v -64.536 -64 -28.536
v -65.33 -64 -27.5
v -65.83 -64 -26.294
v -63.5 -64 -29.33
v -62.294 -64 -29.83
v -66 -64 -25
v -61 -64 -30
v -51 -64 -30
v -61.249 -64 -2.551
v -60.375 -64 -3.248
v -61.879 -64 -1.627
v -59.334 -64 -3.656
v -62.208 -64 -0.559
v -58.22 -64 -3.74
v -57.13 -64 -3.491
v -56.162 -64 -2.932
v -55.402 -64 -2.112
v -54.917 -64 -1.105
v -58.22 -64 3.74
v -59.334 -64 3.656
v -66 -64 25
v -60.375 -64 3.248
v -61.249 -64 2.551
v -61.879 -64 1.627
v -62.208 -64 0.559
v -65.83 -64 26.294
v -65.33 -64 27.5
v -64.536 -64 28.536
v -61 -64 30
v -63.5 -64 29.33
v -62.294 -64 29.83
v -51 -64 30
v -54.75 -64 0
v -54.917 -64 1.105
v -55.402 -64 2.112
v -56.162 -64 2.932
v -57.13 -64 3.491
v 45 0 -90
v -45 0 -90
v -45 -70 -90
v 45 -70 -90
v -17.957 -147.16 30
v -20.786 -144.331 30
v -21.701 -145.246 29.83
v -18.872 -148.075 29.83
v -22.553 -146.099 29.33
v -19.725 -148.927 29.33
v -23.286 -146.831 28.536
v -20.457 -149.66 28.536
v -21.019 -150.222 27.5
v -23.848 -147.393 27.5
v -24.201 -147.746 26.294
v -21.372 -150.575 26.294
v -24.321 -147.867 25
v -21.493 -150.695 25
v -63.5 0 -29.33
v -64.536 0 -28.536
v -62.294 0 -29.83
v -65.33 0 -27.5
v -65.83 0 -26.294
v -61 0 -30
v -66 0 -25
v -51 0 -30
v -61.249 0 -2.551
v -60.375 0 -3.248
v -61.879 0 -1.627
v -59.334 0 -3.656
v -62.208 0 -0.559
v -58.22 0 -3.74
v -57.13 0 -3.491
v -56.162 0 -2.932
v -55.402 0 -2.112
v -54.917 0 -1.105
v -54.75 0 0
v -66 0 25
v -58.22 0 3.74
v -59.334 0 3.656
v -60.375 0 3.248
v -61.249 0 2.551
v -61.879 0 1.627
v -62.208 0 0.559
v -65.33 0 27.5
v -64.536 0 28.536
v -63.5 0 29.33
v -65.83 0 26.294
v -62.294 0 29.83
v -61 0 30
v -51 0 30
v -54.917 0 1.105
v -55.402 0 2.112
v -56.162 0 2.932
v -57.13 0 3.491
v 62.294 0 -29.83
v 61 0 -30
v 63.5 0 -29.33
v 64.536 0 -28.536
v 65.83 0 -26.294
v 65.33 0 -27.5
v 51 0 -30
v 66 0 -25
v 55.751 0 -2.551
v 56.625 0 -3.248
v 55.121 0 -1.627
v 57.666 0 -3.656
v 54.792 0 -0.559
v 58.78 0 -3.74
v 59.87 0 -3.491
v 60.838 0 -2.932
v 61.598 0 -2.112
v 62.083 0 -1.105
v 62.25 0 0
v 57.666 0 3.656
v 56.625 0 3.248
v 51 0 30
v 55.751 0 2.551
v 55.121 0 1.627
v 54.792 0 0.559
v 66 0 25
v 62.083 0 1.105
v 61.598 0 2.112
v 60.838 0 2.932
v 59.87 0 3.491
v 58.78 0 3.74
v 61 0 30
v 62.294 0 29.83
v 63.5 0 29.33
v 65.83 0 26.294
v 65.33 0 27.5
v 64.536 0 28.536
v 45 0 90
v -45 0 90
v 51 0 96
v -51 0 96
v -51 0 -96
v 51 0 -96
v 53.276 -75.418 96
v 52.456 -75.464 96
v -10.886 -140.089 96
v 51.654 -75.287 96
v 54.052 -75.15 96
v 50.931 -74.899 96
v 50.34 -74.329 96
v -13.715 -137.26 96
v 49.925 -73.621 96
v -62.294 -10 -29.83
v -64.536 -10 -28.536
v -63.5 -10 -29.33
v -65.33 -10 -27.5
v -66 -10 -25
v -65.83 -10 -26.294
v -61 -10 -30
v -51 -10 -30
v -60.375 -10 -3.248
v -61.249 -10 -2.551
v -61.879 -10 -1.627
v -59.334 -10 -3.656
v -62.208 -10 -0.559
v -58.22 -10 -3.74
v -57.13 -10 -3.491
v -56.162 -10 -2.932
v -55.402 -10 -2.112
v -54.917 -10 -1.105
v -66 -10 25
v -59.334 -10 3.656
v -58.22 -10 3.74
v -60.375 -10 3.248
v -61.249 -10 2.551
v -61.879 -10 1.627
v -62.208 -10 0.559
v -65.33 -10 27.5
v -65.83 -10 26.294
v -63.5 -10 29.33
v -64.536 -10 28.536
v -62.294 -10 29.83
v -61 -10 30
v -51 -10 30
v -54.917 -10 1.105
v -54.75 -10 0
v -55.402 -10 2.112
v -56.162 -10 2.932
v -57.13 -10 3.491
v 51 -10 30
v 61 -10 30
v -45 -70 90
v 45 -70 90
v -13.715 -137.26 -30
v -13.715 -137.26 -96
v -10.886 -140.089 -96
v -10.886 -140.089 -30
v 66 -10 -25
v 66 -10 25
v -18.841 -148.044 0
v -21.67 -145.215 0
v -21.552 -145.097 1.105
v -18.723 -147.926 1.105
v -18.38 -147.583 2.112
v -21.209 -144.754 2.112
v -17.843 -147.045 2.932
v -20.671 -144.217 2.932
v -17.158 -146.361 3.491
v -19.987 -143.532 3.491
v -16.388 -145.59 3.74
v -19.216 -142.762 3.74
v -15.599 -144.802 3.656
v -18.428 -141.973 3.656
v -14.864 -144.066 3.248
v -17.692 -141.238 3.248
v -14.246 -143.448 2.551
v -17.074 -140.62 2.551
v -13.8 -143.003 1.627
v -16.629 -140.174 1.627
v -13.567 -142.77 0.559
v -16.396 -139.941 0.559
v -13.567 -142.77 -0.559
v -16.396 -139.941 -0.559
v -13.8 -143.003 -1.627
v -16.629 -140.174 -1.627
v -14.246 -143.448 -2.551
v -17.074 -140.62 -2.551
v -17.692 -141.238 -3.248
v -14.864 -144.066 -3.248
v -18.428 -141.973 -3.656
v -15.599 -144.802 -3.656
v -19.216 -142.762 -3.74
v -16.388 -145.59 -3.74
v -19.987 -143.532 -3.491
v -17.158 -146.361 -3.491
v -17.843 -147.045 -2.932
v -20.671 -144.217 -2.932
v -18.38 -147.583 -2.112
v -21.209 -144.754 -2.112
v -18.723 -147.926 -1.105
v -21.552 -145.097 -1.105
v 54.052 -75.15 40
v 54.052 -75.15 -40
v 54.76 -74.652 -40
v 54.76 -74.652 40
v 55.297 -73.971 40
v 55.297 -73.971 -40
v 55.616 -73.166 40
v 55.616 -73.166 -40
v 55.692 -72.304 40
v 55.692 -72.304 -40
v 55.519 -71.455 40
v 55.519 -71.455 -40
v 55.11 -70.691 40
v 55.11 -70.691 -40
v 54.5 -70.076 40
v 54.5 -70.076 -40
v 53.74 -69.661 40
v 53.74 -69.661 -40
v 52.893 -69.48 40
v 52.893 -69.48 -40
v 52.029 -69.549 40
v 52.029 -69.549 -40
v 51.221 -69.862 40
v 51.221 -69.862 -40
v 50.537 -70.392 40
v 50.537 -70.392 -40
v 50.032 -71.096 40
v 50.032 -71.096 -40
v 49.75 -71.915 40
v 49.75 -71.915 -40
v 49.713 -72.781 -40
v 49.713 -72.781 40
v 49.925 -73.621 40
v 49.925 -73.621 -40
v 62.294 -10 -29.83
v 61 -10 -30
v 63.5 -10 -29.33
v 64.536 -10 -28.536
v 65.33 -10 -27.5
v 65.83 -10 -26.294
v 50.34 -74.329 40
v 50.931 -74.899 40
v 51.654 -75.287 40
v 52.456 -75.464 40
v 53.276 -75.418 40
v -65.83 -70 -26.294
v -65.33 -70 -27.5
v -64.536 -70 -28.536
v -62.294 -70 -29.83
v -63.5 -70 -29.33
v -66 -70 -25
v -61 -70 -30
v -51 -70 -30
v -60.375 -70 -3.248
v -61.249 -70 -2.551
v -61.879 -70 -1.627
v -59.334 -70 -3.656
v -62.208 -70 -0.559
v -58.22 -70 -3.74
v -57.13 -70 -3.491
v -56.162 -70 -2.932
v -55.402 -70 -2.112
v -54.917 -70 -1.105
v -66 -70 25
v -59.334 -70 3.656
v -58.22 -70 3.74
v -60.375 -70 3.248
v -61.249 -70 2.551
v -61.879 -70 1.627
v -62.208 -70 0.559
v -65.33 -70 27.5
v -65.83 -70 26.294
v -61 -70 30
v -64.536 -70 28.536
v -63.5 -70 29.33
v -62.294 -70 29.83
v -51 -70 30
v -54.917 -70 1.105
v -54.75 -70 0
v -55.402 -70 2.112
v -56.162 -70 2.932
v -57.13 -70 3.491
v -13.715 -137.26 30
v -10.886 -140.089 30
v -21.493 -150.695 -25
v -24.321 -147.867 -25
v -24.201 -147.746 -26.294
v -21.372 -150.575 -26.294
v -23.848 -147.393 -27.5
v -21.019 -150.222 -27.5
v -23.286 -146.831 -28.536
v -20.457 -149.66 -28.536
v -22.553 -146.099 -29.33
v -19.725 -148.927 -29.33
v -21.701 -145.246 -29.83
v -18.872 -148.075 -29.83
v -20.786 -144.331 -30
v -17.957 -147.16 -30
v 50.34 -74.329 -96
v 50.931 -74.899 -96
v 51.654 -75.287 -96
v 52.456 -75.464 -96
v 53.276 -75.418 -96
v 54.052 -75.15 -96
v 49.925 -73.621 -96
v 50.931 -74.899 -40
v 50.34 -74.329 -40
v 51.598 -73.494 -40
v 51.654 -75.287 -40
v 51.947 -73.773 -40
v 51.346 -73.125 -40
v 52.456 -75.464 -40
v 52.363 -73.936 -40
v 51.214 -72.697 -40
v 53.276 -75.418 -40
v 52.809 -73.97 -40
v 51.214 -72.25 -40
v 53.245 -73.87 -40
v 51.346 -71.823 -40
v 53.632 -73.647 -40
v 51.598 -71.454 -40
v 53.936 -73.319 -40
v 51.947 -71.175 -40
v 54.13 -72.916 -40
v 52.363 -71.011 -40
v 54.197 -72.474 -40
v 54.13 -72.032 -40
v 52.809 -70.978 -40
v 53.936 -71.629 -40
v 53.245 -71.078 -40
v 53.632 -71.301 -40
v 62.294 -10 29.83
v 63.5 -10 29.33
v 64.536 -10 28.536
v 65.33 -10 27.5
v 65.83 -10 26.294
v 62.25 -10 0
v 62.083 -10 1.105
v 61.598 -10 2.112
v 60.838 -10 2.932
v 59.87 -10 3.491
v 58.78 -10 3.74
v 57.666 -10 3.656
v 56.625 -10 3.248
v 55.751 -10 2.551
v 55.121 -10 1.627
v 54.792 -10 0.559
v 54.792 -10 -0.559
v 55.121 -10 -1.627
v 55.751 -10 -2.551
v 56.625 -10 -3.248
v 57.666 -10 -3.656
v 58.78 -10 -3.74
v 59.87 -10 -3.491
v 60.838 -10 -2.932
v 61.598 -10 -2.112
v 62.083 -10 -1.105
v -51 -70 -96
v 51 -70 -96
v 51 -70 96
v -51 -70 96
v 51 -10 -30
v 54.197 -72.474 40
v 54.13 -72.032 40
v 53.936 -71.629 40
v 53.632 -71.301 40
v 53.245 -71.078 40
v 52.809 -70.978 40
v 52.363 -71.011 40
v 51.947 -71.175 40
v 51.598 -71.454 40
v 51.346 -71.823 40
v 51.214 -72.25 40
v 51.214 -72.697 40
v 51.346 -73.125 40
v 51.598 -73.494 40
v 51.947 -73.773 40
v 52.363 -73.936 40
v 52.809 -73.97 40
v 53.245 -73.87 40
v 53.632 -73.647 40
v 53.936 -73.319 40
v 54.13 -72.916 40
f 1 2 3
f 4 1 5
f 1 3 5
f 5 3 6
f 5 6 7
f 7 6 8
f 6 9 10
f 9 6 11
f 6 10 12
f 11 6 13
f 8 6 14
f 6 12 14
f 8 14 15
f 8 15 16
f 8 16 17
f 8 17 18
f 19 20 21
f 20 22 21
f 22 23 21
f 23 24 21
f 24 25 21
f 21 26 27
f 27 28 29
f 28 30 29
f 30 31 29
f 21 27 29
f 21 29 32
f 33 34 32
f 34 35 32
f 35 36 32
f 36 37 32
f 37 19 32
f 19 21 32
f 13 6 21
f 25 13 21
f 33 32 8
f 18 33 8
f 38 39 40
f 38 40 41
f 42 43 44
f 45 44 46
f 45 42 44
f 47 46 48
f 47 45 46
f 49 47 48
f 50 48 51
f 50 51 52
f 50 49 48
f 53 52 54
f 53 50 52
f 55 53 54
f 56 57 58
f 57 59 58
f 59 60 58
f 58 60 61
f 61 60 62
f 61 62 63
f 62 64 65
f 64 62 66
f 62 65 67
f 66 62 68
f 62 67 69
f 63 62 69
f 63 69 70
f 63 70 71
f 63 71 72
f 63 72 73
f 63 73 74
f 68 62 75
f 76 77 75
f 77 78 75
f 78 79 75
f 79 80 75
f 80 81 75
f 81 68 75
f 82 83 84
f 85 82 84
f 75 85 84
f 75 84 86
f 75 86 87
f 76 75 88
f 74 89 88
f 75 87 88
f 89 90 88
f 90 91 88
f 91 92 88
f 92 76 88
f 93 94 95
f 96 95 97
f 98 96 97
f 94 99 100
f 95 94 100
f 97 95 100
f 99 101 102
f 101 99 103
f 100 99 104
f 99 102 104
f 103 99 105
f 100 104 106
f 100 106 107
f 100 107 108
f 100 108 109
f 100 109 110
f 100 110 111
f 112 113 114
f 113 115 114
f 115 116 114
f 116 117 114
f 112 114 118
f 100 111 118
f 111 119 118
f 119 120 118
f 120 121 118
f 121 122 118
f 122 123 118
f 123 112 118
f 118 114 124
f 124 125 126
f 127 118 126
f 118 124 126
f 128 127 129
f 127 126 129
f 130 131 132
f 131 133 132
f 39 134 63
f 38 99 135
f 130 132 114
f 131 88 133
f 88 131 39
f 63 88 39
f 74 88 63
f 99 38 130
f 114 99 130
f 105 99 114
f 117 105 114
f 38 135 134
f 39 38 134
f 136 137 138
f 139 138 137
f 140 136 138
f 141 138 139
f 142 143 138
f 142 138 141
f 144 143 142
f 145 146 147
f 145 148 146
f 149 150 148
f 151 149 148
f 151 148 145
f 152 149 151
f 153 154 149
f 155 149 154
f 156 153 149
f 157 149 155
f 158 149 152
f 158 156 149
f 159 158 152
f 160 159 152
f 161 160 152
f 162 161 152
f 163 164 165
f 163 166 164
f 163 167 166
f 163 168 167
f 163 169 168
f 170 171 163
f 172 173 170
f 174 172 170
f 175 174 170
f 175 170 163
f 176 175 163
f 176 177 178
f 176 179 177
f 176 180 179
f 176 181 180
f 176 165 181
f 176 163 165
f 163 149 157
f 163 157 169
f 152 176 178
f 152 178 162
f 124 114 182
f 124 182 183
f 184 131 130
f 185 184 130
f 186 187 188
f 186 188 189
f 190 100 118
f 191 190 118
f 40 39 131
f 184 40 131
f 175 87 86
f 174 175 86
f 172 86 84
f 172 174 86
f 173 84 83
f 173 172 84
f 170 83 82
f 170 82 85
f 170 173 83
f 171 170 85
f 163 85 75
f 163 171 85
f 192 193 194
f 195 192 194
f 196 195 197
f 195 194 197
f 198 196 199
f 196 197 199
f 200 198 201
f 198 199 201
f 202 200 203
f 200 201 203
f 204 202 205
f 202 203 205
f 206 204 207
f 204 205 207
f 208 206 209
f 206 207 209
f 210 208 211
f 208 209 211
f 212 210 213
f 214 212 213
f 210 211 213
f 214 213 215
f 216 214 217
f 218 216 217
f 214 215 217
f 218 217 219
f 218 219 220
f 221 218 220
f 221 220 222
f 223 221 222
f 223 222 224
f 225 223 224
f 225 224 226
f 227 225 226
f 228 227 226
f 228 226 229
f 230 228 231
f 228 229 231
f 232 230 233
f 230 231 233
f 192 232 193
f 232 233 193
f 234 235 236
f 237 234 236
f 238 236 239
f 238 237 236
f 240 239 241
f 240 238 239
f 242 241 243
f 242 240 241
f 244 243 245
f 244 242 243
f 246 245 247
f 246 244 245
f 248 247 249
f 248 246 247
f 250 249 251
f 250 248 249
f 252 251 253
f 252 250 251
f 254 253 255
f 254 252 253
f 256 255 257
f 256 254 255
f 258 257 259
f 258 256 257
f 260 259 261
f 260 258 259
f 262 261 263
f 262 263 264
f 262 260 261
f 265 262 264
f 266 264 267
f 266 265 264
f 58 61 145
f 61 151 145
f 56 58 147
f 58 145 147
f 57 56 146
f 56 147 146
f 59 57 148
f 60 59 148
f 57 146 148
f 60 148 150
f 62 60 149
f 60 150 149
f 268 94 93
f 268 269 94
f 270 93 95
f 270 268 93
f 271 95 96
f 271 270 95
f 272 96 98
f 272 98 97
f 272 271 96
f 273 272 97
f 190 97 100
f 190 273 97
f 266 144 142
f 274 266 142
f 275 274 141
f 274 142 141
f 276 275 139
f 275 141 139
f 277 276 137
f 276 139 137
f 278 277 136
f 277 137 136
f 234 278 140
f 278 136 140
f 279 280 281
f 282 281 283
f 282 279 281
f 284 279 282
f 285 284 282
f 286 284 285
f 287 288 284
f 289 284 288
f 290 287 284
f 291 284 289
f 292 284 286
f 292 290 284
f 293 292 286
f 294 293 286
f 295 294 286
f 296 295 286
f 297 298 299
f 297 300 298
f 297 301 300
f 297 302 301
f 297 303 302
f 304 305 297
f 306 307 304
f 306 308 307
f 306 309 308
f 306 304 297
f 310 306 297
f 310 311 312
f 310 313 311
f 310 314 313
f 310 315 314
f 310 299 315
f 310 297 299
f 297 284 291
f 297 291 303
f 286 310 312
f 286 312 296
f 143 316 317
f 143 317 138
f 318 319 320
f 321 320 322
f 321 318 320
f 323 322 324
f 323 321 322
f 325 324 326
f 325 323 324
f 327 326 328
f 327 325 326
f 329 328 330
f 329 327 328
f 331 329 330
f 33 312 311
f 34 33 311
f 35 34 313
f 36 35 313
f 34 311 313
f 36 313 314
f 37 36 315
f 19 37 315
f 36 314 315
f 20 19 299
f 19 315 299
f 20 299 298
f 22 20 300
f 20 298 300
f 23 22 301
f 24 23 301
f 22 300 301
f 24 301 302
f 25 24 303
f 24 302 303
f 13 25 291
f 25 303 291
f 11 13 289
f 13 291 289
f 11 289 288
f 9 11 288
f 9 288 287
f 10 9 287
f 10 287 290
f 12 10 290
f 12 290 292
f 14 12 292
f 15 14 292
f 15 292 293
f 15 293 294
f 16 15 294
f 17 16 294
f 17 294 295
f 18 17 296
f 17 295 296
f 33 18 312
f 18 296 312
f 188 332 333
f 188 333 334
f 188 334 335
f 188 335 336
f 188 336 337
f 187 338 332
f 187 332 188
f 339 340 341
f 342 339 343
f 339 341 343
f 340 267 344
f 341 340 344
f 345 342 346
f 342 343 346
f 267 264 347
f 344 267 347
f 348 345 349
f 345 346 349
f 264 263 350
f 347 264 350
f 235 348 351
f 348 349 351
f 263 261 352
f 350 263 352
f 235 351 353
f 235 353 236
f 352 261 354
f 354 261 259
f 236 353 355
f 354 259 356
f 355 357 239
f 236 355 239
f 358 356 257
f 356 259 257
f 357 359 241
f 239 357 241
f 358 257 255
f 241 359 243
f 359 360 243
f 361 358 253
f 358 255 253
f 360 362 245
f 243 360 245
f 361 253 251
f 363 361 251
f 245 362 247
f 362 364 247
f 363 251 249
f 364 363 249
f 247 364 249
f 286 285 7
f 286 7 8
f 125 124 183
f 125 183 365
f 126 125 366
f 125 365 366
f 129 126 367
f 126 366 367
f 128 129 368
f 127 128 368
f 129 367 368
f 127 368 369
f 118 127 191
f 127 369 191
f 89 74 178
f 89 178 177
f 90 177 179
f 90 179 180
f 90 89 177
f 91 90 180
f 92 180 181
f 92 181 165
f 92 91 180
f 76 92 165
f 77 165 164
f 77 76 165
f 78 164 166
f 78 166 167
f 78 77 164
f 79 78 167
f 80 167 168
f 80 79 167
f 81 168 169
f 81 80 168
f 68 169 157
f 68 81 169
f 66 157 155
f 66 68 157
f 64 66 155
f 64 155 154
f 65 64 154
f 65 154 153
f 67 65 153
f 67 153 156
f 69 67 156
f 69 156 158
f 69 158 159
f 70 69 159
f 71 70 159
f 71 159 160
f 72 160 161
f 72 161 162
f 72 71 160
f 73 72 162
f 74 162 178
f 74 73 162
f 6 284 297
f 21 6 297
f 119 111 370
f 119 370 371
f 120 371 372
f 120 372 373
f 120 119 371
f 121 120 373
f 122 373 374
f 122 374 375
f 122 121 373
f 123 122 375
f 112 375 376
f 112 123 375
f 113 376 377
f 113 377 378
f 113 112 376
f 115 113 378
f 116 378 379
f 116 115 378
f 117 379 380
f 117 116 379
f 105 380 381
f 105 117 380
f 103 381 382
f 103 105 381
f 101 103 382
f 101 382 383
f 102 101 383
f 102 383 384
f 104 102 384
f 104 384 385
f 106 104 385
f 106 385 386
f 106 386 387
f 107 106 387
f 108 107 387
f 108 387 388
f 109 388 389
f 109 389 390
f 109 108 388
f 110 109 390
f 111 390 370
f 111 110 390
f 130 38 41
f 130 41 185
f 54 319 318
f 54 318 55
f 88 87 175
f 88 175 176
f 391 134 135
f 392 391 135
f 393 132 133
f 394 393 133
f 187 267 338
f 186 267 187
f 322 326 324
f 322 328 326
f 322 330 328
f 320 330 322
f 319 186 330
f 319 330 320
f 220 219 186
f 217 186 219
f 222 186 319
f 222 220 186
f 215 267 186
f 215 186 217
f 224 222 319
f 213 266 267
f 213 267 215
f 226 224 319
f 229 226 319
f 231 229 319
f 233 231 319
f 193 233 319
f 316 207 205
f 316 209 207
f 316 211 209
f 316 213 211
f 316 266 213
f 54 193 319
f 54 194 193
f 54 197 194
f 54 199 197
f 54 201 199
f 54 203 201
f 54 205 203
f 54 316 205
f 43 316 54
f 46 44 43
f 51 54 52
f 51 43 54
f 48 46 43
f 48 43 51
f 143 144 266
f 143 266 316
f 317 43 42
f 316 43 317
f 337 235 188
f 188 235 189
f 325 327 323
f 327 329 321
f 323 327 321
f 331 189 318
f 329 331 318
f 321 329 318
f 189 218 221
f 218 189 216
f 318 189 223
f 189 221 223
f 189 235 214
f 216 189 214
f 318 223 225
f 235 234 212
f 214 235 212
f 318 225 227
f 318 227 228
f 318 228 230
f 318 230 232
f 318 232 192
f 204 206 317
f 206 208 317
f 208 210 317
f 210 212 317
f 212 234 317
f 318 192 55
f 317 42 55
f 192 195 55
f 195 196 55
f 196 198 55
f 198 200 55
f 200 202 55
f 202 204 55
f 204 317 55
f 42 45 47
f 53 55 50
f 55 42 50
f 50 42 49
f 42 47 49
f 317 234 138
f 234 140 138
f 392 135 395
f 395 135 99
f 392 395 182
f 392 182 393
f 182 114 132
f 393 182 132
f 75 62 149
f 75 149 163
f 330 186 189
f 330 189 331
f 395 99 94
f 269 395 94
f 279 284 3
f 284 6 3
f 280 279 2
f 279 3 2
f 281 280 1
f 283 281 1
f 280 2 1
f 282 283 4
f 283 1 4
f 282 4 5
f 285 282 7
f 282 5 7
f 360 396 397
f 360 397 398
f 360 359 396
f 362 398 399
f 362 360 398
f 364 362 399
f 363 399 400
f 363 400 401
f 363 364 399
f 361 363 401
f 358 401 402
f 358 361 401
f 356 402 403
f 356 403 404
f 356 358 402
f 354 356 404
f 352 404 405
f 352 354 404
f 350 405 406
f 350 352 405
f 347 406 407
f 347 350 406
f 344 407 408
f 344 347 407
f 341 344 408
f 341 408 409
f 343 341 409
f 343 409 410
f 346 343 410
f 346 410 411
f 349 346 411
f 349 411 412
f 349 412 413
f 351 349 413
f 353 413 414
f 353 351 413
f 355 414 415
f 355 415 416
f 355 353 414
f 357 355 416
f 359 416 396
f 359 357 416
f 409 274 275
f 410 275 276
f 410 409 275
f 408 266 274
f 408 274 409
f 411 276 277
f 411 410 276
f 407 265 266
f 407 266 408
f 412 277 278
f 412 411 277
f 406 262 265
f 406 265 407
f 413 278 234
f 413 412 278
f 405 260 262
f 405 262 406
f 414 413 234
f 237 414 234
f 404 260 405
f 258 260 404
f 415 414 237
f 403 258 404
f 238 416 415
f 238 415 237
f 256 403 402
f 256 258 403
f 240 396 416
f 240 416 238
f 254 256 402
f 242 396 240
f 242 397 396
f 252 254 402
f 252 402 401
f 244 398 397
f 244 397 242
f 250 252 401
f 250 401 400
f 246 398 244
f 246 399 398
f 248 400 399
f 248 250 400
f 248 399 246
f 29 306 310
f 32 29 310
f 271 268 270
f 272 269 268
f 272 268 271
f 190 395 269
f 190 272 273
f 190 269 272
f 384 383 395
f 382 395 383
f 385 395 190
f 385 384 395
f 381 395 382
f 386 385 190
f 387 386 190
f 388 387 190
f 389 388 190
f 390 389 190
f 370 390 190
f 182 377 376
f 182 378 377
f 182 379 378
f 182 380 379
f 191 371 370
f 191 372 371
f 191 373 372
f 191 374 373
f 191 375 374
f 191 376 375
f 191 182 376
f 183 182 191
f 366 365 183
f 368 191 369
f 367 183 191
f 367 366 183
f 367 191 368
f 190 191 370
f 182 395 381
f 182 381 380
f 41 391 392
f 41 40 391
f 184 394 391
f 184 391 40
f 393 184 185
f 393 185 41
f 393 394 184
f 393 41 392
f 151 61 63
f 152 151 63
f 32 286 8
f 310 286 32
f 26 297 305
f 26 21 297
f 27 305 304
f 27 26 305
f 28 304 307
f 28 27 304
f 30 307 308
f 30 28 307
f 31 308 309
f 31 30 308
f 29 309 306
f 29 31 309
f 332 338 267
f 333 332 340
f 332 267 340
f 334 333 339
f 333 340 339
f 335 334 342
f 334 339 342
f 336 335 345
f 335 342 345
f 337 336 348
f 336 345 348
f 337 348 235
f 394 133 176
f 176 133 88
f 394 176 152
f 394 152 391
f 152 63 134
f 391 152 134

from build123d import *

# Parameters (mm, degrees)
F0_W           = 90
F0_H           = 180
F1_DEPTH       = 70
F0_W_2         = 15
F0_H_2         = 60
F0_R           = 3.75
F2_DEPTH       = 10
F3_R           = 5
F5_R           = 3
F5_R_2         = 1.5
F6_DEPTH       = 40
F7_W           = 15
F7_H           = 60
F7_R           = 3.75
F8_DEPTH       = 6
F11_END_RADIUS = 3
F10_W          = 4
F10_H          = 192
F11_REACH      = 324.2716302284
F12_R          = 3.75
F13_DEPTH      = 4
F14_R          = 5
F15_R          = 5


with BuildPart() as f1:
    # F0 (on Front) → F1 (new body)
    with BuildSketch(Plane.XZ):
        Polygon((51, 96), (-51, 96), (-51, 30), (-51, -30), (-51, -96), (51, -96), (51, -30), (51, 30), align=None)
        Rectangle(F0_W, F0_H, mode=Mode.SUBTRACT)
    extrude(amount=F1_DEPTH)

    # F0 (on Front) → F2 (join)
    with BuildSketch(Plane.XZ):
        with Locations((-58.5, 0)):
            Rectangle(F0_W_2, F0_H_2)
        with Locations((-58.5, 0)):
            Circle(F0_R, mode=Mode.SUBTRACT)
        with Locations((58.5, 0)):
            Rectangle(F0_W_2, F0_H_2)
        with Locations((58.5, 0)):
            Circle(F0_R, mode=Mode.SUBTRACT)
    extrude(amount=F2_DEPTH)

    # F3
    f3_edges = [f1.edges().sort_by_distance(p)[0] for p in [
        (66, -5, 30),
        (66, -5, -30),
        (-66, -5, -30),
        (-66, -5, 30),
    ]]
    fillet(f3_edges, radius=F3_R)


with BuildPart() as f6:
    # F5 (on Top) → F6 (new body, symmetric)
    with BuildSketch(Plane.XY):
        with Locations((52.6971285333, -72.4738138049)):
            Circle(F5_R)
        with Locations((52.6971285333, -72.4738138049)):
            Circle(F5_R_2, mode=Mode.SUBTRACT)
    extrude(amount=F6_DEPTH, both=True)

    f11_end = (Plane(origin=(52.6971285333, -72.4738138049, 0), x_dir=(1, 0, 0), z_dir=(0, 0, 1)) * Cylinder(F11_END_RADIUS, 1138.3770958347, mode=Mode.PRIVATE)).faces().sort_by_distance((49.6971285333, -72.4738138049, 0))[0]
    # F10 (on face) → F11 (join, up to the whole of a round face its end follows)
    with BuildSketch(Plane(origin=(-60.5, -60.5, 0), x_dir=(0.7071067812, -0.7071067812, 0), z_dir=(-0.7071067812, -0.7071067812, 0))):
        with Locations((89.3599205236, 0)):
            Rectangle(F10_W, F10_H)
    f11_long = extrude(amount=-F11_REACH, mode=Mode.PRIVATE)
    add(split(f11_long, bisect_by=f11_end, keep=Keep.ALL, mode=Mode.PRIVATE).solids().sort_by_distance((2.6870057685, -123.6870057685, 0))[0])

    # F12 (on face) → F13 (join)
    with BuildSketch(Plane(origin=(61.7727922061, -61.7727922061, 0), x_dir=(-0.7071067812, -0.7071067812, 0), z_dir=(-0.7071067812, 0.7071067812, 0))):
        Polygon((85.5599205236, 96), (85.5599205236, -96), (106.7553205236, -96), (106.7553205236, -30), (121.7553205236, -30), (121.7553205236, 30), (106.7553205236, 30), (106.7553205236, 96), align=None)
        with Locations((114.2553205236, 0)):
            Circle(F12_R, mode=Mode.SUBTRACT)
    extrude(amount=-F13_DEPTH)

    # F14
    f14_edges = [f6.edges().sort_by_distance(p)[0] for p in [
        (-22.907007, -149.281019, 30),
        (-22.907007, -149.281019, -30),
    ]]
    fillet(f14_edges, radius=F14_R)


with BuildPart() as f8:
    # F7 (on face) → F8 (new body)
    with BuildSketch(Plane.XZ.offset(70)):
        with Locations((-58.5, 0)):
            Rectangle(F7_W, F7_H)
        with Locations((-58.5, 0)):
            Circle(F7_R, mode=Mode.SUBTRACT)
    extrude(amount=-F8_DEPTH)

    # F15
    f15_edges = [f8.edges().sort_by_distance(p)[0] for p in [
        (-66, -67, 30),
        (-66, -67, -30),
    ]]
    fillet(f15_edges, radius=F15_R)


with BuildPart() as f6_1:
    # F16: moved
    add(f6.part)


solid = Compound([f1.part, f8.part, f6_1.part])
